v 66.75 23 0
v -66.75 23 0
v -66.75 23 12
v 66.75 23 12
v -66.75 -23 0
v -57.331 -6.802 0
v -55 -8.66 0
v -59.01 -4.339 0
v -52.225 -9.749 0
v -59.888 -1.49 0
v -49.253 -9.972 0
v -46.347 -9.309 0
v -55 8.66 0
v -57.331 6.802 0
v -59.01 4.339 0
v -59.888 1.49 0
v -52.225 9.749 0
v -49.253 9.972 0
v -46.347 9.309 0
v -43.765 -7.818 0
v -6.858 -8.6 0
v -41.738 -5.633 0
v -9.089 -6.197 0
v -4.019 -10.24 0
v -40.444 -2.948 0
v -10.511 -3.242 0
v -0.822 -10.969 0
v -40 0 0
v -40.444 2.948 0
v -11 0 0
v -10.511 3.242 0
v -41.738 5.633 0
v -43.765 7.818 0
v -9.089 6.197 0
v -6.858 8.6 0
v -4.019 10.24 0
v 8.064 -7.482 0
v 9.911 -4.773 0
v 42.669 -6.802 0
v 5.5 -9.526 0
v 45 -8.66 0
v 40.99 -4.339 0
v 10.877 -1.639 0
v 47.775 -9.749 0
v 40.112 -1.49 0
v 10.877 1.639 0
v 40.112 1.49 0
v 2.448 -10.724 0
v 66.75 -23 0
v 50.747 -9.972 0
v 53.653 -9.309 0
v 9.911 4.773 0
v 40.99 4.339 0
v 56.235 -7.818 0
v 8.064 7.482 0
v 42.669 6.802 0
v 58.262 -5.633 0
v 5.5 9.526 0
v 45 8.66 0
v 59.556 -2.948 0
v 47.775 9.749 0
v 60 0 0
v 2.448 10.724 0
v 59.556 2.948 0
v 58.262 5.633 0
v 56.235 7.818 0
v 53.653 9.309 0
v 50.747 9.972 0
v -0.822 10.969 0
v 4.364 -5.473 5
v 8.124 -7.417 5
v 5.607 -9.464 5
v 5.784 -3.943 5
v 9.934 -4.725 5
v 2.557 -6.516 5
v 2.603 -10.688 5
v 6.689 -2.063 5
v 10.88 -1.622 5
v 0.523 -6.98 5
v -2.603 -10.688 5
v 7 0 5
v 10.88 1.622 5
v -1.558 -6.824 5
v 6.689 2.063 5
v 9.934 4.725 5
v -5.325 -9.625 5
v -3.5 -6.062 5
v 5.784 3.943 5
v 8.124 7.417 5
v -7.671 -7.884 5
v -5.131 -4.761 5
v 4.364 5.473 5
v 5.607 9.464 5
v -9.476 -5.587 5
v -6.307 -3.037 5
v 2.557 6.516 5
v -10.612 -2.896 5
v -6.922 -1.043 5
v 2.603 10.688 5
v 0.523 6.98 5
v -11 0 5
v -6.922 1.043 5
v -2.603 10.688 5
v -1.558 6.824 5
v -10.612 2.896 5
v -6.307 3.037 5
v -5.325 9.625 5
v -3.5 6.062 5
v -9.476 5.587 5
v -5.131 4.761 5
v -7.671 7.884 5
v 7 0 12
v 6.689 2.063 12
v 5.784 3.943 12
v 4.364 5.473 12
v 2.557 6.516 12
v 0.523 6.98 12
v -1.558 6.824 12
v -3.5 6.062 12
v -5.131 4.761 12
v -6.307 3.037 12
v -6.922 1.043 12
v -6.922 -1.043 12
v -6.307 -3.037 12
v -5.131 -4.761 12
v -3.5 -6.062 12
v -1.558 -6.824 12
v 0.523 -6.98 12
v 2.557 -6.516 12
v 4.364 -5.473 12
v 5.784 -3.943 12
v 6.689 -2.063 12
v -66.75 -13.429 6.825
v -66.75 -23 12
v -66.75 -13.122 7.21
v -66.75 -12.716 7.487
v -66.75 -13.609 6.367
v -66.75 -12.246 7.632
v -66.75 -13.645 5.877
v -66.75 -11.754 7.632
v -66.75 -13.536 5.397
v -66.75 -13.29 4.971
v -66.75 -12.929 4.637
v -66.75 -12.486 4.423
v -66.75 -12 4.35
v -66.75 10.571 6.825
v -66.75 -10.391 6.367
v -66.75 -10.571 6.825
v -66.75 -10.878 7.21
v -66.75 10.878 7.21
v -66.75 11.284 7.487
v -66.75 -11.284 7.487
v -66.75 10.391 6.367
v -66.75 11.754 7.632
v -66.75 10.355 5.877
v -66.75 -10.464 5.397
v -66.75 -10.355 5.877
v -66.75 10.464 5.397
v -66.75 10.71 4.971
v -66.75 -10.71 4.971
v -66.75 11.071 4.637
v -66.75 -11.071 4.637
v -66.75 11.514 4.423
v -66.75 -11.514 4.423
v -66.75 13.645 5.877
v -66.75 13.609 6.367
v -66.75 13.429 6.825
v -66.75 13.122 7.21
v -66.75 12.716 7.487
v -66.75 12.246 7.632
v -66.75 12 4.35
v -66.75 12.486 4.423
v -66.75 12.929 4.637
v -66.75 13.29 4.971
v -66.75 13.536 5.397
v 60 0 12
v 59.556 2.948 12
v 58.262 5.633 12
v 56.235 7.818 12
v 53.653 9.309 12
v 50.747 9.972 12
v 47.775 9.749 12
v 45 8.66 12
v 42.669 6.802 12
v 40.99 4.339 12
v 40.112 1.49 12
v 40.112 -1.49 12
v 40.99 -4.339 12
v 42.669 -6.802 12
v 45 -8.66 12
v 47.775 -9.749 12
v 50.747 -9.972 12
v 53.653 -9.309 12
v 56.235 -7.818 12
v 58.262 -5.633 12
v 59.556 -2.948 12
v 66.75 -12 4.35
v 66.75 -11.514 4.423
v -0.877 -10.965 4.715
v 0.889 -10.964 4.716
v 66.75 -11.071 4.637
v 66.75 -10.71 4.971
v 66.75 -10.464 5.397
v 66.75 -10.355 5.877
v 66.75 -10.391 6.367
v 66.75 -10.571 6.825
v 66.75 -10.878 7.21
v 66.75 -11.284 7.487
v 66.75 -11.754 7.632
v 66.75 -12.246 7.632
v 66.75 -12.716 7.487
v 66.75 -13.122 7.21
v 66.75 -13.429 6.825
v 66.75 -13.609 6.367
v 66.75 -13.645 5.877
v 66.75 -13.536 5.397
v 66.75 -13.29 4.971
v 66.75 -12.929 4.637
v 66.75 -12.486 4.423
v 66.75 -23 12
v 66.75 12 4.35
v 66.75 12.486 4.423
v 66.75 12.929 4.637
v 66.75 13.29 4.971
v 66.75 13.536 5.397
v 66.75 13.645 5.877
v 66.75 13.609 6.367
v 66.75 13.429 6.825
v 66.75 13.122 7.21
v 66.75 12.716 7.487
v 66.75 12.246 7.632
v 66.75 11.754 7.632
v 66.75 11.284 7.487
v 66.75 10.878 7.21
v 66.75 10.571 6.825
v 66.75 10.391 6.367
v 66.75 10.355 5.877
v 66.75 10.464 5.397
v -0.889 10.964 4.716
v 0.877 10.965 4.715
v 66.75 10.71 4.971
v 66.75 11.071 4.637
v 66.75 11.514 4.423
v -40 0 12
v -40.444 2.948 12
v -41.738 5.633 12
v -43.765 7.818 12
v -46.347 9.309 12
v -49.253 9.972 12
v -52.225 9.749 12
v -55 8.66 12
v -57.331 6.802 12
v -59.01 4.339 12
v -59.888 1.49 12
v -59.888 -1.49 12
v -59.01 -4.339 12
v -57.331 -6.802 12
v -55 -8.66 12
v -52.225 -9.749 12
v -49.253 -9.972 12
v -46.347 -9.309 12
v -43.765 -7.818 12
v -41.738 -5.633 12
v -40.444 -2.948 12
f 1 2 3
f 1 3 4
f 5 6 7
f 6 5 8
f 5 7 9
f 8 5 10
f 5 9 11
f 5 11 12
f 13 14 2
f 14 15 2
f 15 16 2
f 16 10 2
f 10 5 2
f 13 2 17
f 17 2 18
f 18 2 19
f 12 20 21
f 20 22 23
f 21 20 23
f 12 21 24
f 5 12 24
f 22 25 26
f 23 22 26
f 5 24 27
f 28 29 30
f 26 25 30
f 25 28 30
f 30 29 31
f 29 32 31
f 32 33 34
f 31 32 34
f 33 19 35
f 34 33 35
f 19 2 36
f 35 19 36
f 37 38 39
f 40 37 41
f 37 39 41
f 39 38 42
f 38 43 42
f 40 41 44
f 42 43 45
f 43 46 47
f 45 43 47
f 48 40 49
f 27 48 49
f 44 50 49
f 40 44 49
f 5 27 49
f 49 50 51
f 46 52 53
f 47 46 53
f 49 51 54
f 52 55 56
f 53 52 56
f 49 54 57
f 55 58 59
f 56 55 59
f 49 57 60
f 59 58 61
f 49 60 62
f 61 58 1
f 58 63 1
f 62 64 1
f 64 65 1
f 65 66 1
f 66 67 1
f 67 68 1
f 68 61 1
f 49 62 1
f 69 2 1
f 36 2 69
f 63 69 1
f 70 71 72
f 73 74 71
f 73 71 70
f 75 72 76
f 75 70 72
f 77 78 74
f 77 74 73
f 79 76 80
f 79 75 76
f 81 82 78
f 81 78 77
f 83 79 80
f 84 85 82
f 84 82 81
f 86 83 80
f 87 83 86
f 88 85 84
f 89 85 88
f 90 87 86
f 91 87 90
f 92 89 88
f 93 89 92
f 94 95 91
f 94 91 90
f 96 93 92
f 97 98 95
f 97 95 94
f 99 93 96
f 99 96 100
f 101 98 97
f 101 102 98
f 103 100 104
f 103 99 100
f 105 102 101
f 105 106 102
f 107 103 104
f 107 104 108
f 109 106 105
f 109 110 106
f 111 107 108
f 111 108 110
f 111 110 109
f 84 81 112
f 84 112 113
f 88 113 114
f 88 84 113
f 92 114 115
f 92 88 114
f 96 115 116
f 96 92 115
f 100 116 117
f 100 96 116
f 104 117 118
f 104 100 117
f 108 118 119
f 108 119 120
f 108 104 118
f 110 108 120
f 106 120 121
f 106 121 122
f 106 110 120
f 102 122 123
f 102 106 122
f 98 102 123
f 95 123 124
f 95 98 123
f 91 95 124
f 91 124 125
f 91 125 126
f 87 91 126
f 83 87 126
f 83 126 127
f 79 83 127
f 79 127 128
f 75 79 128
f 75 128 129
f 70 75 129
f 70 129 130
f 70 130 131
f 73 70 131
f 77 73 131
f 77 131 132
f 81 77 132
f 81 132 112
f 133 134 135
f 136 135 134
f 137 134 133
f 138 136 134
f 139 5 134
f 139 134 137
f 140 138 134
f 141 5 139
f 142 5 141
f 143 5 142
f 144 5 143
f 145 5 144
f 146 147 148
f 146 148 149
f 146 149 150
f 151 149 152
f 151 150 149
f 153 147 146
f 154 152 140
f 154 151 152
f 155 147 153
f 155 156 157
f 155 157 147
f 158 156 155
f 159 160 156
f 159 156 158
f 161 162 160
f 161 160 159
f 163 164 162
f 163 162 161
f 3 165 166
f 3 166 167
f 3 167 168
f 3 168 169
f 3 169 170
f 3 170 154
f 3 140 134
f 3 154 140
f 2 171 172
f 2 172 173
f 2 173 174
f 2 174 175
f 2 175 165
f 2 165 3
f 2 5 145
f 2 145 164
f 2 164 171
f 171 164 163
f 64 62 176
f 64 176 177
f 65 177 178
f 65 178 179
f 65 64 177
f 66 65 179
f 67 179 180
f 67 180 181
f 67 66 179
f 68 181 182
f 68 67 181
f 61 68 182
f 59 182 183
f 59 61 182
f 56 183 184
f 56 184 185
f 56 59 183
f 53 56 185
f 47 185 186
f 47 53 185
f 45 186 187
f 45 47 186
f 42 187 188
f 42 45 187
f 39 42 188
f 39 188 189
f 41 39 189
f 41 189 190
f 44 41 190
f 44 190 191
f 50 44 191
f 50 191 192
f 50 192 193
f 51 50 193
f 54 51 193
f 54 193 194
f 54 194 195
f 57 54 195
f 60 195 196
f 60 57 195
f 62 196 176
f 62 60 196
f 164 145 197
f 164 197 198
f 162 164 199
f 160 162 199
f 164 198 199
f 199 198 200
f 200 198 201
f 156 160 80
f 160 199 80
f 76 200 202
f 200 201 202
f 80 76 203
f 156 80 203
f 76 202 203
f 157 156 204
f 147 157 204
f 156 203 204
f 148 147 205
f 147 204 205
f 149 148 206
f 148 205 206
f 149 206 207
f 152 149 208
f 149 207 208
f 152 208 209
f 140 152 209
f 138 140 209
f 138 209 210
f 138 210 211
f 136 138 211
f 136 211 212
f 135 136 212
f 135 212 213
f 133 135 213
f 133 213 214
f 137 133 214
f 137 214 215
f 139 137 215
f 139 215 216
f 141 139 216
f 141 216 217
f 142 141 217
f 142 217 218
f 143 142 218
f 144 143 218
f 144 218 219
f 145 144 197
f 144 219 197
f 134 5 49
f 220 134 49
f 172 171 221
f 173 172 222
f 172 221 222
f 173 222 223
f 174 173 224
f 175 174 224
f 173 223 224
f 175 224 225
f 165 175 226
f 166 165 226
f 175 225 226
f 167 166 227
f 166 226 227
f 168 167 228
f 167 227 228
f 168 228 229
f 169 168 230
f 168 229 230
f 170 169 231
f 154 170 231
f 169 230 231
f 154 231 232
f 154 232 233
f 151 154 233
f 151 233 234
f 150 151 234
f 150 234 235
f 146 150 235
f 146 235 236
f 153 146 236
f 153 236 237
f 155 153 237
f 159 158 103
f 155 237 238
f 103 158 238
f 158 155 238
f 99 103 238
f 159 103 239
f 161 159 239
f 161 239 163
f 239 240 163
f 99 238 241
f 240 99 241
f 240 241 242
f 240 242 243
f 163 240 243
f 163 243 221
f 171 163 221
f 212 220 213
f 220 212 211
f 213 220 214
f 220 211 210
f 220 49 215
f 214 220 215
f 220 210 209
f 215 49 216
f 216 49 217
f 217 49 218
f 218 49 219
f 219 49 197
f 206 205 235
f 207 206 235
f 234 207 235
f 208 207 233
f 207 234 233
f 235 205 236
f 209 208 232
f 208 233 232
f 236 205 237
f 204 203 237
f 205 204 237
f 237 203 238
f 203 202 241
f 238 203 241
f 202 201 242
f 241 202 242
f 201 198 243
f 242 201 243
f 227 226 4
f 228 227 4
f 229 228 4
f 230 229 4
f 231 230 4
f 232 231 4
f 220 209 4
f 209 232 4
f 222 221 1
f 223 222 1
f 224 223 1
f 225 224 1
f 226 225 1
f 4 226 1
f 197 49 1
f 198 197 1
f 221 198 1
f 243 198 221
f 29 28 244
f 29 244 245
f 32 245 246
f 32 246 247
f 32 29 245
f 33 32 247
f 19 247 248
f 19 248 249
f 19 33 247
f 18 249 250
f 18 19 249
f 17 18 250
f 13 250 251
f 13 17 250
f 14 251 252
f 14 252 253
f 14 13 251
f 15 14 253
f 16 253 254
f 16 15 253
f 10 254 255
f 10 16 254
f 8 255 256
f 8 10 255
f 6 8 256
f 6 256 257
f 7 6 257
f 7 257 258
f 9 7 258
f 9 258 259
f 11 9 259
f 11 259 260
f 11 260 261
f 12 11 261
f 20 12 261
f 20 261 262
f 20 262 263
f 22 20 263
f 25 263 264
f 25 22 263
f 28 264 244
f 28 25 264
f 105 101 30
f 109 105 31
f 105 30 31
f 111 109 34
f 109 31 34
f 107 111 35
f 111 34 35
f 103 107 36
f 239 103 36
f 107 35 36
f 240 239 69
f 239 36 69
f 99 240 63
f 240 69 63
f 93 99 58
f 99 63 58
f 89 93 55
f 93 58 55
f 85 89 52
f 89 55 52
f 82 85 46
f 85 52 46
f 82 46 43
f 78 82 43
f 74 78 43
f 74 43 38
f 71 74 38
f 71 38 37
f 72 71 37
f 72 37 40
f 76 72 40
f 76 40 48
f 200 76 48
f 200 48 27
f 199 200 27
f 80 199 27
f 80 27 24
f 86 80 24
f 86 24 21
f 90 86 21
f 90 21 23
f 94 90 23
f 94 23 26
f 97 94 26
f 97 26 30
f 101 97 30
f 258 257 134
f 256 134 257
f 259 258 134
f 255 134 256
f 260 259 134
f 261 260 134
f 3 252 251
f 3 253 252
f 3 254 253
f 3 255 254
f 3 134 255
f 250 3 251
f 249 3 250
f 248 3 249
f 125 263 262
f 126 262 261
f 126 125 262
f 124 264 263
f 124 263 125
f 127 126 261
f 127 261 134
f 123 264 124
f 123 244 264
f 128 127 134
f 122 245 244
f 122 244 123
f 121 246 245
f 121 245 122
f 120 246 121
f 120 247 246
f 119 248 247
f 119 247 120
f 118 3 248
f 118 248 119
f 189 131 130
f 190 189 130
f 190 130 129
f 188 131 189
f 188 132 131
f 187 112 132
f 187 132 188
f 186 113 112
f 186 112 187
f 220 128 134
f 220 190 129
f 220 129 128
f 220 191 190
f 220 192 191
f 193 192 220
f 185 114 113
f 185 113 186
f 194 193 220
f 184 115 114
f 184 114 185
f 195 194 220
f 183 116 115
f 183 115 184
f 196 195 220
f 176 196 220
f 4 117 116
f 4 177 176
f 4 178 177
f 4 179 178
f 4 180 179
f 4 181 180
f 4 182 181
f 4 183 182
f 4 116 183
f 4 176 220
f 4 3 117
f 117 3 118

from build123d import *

# Parameters (mm, degrees)
SKETCH1_W           = 133.5
SKETCH1_H           = 46
SKETCH1_R           = 10
SKETCH1_R_2         = 7
BOSS_EXTRUDE1_DEPTH = 12
SKETCH2_R           = 11
CUT_EXTRUDE1_DEPTH  = 5
M4_TAPPED_HOLE1_D   = 3.3


with BuildPart() as part:
    # Sketch1 → Boss-Extrude1 (new body)
    with BuildSketch(Plane.XY):
        Rectangle(SKETCH1_W, SKETCH1_H)
        with Locations((50, 0)):
            Circle(SKETCH1_R, mode=Mode.SUBTRACT)
        with Locations((-50, 0)):
            Circle(SKETCH1_R, mode=Mode.SUBTRACT)
        Circle(SKETCH1_R_2, mode=Mode.SUBTRACT)
    extrude(amount=BOSS_EXTRUDE1_DEPTH)

    # Sketch2 → Cut-Extrude1 (cut)
    with BuildSketch(Plane(origin=(0, 0, 0), x_dir=(-1, 0, 0), z_dir=(0, 0, -1))):
        Circle(SKETCH2_R)
    extrude(amount=-CUT_EXTRUDE1_DEPTH, mode=Mode.SUBTRACT)

    # M4 Tapped Hole1 (through all)
    with Locations(Plane.ZY.offset(66.75)):
        with Locations((6, 12), (6, -12)):
            m4_tapped_hole1 = Hole(M4_TAPPED_HOLE1_D / 2)

    # Mirror1: M4 Tapped Hole1 across plane
    add(m4_tapped_hole1.mirror(Plane(origin=(0, 0, 0), x_dir=(0, 0, 1), z_dir=(1, 0, 0))), mode=Mode.SUBTRACT)


solid = part.part
